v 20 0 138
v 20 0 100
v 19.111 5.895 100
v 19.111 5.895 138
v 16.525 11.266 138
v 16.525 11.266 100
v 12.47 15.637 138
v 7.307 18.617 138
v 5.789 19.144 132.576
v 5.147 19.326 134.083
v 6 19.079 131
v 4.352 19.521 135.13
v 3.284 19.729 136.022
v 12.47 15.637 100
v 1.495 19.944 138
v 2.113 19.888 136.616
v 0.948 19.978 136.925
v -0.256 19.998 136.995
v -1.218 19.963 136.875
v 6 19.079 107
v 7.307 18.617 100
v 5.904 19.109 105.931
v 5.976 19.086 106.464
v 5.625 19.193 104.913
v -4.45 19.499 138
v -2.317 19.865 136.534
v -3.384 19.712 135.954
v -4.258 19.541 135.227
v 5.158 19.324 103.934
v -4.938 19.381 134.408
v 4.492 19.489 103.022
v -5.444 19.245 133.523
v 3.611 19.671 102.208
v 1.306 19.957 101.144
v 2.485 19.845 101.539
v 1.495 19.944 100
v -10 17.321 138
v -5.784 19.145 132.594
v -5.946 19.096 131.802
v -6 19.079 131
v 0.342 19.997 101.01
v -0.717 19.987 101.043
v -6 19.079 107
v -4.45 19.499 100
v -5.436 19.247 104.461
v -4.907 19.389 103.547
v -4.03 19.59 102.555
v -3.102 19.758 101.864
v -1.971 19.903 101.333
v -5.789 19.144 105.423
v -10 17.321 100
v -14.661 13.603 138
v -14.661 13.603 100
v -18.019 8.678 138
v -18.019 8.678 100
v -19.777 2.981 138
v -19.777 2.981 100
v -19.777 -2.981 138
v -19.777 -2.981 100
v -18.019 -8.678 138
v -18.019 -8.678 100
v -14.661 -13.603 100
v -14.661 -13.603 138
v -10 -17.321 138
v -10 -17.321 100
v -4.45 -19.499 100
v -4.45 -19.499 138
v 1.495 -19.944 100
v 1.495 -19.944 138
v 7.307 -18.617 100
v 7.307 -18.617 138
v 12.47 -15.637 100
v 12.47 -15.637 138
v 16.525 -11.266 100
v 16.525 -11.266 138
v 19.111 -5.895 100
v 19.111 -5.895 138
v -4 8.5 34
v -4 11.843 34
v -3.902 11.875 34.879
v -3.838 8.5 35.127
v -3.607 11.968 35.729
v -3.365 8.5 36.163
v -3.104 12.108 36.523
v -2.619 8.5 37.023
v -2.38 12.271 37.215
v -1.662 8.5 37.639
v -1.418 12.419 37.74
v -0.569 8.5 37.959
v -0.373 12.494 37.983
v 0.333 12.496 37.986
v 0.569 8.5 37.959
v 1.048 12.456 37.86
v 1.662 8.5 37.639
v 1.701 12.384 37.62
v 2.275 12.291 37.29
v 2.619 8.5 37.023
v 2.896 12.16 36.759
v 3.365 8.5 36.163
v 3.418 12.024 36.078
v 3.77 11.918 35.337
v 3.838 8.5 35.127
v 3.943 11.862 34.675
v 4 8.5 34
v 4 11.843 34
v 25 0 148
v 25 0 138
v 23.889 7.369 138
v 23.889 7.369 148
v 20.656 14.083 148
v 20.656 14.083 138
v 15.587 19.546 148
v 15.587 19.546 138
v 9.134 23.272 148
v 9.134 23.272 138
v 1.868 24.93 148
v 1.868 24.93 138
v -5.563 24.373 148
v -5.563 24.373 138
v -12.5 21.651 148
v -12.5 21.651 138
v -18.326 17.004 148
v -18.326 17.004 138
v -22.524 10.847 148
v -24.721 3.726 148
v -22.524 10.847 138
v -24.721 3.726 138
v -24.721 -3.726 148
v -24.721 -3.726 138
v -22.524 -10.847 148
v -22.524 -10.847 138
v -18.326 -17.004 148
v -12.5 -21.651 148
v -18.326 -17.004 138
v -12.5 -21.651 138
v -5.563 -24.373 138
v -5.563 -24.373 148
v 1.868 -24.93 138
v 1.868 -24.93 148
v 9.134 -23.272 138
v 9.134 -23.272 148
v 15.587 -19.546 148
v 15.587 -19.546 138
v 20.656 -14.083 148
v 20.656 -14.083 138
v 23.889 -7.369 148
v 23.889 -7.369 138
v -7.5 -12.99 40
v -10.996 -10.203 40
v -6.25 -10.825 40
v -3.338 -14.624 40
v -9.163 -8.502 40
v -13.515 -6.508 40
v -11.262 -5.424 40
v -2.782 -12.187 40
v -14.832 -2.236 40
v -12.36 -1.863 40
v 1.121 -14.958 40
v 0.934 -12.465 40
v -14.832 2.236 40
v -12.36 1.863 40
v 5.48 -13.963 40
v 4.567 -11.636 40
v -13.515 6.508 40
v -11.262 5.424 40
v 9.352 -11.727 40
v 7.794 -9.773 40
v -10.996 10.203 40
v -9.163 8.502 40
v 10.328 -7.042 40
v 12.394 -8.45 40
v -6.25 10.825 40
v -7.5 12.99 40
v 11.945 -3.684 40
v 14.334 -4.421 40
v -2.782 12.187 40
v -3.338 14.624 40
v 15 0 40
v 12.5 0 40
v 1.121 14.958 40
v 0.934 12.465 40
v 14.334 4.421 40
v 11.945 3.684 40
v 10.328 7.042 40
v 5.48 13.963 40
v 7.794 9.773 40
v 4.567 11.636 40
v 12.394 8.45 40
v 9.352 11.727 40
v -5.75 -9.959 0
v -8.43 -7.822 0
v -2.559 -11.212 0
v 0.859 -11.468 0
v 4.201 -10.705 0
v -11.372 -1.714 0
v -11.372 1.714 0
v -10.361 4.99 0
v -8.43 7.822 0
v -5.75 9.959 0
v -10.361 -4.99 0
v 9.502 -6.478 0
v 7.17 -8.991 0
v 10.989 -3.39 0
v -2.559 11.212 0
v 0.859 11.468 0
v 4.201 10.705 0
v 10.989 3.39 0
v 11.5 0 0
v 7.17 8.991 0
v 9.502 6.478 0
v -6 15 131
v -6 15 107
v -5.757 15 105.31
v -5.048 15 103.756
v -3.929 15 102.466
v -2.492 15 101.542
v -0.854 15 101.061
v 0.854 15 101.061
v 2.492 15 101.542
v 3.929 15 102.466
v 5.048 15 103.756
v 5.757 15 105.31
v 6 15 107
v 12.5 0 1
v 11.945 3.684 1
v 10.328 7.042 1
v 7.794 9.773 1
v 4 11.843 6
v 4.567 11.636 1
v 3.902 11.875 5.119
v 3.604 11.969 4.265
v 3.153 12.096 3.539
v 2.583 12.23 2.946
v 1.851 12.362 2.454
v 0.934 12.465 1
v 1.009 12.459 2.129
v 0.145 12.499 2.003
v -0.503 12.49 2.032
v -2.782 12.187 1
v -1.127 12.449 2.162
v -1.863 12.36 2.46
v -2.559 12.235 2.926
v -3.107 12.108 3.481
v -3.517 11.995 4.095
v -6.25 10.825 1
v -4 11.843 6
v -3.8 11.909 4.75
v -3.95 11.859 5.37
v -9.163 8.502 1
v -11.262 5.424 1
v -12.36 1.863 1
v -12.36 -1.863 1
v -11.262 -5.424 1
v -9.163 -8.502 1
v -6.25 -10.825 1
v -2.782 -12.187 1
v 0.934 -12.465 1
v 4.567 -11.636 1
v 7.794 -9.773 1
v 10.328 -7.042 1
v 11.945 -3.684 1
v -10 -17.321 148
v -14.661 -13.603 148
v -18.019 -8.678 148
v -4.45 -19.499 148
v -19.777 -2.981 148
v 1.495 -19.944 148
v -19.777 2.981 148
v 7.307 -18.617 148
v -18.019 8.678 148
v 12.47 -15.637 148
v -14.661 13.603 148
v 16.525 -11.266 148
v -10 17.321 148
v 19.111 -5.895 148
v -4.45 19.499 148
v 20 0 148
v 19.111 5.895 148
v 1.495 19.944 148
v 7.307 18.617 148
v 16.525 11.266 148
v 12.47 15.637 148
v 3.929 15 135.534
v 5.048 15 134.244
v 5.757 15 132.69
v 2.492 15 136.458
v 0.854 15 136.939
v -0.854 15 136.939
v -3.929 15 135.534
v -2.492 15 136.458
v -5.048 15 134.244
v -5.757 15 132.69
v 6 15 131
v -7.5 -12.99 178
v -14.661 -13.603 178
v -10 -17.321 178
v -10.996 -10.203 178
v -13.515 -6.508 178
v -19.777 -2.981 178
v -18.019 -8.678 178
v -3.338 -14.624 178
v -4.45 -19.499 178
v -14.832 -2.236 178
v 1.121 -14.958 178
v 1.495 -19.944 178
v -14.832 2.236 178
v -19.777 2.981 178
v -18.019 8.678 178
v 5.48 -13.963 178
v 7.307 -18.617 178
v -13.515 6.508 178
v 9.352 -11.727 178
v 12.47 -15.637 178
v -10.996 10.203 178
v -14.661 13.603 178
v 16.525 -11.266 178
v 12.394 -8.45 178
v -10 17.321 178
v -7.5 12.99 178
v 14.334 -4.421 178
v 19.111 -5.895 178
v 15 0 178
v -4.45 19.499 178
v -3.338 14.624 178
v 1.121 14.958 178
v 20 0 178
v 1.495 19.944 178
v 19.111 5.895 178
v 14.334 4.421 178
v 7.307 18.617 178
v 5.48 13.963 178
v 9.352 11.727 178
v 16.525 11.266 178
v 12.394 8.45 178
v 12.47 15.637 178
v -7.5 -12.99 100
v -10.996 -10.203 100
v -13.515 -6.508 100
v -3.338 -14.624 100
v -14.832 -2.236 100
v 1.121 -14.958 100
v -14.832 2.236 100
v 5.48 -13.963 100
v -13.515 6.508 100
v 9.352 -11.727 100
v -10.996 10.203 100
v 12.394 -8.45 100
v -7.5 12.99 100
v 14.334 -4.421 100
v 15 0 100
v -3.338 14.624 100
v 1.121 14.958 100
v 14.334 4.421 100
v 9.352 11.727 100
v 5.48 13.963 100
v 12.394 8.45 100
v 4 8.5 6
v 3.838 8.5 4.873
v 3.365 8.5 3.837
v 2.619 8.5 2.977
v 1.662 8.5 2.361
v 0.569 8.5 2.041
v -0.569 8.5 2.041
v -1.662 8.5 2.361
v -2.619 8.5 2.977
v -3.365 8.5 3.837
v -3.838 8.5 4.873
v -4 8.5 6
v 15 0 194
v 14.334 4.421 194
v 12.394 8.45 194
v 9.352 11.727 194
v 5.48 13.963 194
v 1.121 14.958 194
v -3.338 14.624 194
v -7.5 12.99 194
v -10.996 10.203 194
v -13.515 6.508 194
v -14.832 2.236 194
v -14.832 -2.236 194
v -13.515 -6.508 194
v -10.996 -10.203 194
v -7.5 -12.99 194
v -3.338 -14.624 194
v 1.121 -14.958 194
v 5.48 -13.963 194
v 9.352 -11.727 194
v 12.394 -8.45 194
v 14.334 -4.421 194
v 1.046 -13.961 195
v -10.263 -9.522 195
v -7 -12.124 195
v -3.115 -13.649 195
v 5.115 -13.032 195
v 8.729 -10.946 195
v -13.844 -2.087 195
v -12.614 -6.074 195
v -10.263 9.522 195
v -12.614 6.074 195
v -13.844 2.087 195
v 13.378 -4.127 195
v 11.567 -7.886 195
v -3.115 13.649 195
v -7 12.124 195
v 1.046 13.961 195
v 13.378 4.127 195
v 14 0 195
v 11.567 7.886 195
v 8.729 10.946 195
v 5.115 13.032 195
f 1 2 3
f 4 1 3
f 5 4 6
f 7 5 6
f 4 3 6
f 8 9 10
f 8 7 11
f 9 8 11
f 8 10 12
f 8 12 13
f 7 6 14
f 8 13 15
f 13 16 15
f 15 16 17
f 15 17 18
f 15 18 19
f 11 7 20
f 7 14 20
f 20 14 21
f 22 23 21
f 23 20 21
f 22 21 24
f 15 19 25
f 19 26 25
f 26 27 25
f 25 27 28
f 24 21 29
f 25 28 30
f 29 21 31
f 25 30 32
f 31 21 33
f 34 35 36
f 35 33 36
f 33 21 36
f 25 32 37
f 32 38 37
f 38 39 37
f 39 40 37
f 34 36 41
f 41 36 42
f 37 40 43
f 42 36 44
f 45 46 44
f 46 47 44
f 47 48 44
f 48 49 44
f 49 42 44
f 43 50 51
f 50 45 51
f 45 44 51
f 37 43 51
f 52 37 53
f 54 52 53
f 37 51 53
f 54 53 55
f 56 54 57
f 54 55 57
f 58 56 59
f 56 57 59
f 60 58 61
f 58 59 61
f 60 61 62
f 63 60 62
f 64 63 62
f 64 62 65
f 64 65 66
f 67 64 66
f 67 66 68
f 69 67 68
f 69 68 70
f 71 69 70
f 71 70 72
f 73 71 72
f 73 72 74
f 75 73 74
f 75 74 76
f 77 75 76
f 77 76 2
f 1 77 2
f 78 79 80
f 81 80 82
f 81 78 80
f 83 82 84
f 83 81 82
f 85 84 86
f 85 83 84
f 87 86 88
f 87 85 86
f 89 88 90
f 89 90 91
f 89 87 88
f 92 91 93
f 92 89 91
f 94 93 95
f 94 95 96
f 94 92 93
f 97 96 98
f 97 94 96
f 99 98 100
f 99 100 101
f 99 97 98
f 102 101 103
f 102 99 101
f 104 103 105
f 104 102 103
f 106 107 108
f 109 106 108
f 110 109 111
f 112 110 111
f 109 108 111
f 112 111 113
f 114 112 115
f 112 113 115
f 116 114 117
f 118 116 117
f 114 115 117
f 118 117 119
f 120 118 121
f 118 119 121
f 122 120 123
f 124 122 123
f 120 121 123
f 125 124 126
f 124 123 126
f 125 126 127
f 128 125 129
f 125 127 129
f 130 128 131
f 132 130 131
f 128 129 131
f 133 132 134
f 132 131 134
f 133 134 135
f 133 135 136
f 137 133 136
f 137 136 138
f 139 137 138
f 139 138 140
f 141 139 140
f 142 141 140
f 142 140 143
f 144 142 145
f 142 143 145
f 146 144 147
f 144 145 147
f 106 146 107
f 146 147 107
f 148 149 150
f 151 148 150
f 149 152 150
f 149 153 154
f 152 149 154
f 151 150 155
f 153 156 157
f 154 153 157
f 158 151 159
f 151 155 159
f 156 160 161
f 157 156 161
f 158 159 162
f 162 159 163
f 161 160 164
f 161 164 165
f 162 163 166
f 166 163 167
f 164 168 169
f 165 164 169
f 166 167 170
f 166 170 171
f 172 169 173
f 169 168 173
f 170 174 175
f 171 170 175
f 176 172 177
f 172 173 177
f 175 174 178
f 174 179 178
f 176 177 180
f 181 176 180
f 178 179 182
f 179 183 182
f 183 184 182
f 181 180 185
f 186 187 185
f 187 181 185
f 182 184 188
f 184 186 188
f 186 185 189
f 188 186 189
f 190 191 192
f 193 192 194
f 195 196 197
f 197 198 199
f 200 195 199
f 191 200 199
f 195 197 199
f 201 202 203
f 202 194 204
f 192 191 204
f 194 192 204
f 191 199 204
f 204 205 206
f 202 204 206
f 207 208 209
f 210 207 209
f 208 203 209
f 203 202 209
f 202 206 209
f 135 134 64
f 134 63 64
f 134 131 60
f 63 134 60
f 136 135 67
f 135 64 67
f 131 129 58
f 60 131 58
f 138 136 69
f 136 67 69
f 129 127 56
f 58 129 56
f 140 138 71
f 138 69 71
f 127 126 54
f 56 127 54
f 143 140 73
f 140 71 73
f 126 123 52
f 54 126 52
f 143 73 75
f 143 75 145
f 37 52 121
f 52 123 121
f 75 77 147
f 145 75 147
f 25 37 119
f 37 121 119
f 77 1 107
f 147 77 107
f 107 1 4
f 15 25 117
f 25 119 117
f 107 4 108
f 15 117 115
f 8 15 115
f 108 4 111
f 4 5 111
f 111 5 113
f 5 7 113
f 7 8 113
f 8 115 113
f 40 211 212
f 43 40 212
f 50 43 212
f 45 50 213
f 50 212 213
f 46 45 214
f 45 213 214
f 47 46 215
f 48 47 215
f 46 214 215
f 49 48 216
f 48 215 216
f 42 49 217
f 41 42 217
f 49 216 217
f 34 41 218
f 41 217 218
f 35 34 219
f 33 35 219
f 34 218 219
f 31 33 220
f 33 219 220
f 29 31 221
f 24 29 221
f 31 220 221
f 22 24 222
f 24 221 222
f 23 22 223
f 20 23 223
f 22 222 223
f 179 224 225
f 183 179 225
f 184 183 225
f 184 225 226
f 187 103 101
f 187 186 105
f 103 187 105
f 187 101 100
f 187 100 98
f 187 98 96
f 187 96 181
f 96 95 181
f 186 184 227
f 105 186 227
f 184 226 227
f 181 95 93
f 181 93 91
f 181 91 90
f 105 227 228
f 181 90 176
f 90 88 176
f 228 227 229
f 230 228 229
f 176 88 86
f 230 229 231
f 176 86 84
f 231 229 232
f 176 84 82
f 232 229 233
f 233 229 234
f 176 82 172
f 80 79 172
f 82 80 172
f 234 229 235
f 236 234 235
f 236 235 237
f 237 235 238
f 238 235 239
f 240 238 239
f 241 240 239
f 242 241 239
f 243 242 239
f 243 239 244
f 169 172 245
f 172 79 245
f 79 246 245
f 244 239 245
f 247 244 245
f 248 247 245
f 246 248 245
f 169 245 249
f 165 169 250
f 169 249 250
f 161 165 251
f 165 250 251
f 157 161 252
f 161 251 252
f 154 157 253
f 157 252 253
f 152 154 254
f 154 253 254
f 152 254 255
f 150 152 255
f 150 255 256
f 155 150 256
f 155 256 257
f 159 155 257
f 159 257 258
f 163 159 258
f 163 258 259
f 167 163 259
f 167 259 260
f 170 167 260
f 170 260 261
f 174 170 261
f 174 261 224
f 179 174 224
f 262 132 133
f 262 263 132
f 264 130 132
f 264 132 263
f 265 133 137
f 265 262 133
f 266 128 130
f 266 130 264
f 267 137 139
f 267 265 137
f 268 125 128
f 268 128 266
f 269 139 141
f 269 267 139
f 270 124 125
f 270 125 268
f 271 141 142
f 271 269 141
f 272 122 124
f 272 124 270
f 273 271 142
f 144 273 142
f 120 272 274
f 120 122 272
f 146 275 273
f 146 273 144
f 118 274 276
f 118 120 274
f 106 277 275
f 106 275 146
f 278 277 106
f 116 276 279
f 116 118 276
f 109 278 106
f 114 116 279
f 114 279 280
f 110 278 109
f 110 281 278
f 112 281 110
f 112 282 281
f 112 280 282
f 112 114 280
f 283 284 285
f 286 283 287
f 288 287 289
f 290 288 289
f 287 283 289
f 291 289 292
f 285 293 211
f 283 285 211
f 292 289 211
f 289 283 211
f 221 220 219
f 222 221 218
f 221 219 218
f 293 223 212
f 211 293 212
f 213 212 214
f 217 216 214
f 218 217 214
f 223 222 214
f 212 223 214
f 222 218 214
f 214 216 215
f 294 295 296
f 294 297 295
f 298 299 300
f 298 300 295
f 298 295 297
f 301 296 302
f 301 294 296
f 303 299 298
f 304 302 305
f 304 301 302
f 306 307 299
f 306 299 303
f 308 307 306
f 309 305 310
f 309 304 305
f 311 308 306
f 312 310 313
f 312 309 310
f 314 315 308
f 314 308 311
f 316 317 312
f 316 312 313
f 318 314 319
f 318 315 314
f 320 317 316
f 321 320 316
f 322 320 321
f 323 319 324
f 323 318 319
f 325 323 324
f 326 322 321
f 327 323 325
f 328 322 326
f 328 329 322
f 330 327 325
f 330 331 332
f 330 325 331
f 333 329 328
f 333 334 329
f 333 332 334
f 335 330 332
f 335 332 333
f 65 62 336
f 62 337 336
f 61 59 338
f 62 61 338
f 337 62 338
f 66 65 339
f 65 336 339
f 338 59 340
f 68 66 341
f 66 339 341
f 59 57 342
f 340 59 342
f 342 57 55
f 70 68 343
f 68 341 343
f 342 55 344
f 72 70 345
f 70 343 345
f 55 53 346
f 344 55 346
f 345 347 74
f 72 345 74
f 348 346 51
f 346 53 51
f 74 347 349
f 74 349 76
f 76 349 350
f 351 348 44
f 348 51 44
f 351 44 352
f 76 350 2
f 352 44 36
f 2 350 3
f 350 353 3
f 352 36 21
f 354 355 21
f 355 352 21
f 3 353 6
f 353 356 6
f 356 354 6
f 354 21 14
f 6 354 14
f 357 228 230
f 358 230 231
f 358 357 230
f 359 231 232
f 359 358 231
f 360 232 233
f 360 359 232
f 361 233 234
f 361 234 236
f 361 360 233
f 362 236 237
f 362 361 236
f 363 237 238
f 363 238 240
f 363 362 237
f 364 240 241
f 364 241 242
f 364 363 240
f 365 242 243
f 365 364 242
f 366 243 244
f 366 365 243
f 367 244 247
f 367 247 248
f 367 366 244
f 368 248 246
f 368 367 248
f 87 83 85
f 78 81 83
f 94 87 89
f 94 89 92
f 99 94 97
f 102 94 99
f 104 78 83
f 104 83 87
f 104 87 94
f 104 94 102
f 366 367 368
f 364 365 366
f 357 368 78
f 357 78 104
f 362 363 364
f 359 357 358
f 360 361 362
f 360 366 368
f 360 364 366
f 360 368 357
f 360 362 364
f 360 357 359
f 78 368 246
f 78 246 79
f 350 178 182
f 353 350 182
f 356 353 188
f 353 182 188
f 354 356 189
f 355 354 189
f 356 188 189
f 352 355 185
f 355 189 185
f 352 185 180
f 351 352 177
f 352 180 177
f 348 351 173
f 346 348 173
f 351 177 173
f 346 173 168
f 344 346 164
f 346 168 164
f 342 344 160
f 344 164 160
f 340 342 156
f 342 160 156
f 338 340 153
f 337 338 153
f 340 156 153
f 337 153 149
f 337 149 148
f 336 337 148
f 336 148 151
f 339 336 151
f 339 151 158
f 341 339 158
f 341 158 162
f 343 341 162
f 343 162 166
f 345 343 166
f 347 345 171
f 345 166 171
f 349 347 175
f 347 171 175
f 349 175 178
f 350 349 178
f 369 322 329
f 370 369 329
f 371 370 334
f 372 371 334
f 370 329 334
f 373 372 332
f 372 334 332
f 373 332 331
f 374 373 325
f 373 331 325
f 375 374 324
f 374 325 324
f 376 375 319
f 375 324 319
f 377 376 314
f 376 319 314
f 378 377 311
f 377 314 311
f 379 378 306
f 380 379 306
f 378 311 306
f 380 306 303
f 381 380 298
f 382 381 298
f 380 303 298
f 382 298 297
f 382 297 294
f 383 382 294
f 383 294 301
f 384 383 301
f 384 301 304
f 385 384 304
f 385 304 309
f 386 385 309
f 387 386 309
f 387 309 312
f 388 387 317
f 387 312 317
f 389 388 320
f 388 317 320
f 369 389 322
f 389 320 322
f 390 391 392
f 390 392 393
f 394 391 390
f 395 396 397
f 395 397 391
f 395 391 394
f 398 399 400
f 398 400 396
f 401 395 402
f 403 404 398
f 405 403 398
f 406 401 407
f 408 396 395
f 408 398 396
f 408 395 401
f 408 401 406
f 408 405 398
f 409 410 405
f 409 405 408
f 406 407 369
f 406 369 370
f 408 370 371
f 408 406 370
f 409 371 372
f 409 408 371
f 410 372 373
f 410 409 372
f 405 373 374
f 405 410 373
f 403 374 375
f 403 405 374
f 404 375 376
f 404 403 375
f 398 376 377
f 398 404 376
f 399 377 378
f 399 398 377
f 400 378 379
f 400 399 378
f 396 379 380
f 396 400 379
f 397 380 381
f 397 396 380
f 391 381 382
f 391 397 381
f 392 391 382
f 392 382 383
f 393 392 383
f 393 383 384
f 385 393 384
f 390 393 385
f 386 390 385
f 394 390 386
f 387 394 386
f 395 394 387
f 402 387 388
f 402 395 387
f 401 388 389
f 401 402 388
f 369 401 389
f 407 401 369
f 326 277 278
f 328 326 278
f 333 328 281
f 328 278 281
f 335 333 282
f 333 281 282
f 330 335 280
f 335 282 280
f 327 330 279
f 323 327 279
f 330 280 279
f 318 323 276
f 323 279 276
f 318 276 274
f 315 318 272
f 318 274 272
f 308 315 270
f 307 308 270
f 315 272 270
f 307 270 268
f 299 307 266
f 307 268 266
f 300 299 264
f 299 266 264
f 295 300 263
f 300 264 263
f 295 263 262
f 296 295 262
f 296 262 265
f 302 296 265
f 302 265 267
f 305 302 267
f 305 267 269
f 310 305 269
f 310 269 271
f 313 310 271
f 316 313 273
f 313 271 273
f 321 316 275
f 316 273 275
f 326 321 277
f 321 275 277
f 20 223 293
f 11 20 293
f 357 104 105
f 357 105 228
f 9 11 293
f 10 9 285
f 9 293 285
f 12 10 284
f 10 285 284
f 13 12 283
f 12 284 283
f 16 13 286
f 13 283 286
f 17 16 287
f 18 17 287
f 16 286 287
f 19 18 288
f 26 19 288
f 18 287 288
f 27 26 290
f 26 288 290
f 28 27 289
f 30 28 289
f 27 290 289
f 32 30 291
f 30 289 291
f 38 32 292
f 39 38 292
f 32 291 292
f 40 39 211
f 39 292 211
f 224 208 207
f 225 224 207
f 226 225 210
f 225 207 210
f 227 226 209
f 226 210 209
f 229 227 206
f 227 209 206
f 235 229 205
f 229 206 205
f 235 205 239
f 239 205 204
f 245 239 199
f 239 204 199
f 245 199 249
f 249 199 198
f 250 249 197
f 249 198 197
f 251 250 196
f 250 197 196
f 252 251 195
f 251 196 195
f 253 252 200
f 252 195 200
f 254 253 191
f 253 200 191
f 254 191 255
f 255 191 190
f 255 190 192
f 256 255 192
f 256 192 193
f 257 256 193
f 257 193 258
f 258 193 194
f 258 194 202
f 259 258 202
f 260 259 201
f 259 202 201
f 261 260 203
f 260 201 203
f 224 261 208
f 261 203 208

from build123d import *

# Parameters (mm, degrees)
SKETCH_1_R          = 12.5
EXTRUDE_1_DEPTH     = 40
SKETCH_2_R          = 15
EXTRUDE_2_DEPTH     = 60
SKETCH_3_R          = 20
EXTRUDE_3_DEPTH     = 38
SKETCH_4_R          = 25
EXTRUDE_4_DEPTH     = 10
SKETCH_5_R          = 20
EXTRUDE_5_DEPTH     = 30
SKETCH_6_R          = 15
EXTRUDE_6_DEPTH     = 17
CHAMFER_1_SIZE      = 1
CHAMFER_2_SIZE      = 1
CUT_EXTRUDE_1_DEPTH = 24
CUT_EXTRUDE_2_DEPTH = 14


with BuildPart() as part:
    # 草图1 → 凸台-拉伸1 (new body)
    with BuildSketch(Plane.XY):
        Circle(SKETCH_1_R)
    extrude(amount=EXTRUDE_1_DEPTH)

    # 草图2 → 凸台-拉伸2 (add)
    with BuildSketch(Plane.XY.offset(40)):
        Circle(SKETCH_2_R)
    extrude(amount=EXTRUDE_2_DEPTH)

    # 草图3 → 凸台-拉伸3 (add)
    with BuildSketch(Plane.XY.offset(100)):
        Circle(SKETCH_3_R)
    extrude(amount=EXTRUDE_3_DEPTH)

    # 草图4 → 凸台-拉伸4 (add)
    with BuildSketch(Plane.XY.offset(138)):
        Circle(SKETCH_4_R)
    extrude(amount=EXTRUDE_4_DEPTH)

    # 草图5 → 凸台-拉伸5 (add)
    with BuildSketch(Plane.XY.offset(148)):
        Circle(SKETCH_5_R)
    extrude(amount=EXTRUDE_5_DEPTH)

    # 草图6 → 凸台-拉伸6 (add)
    with BuildSketch(Plane.XY.offset(178)):
        Circle(SKETCH_6_R)
    extrude(amount=EXTRUDE_6_DEPTH)

    # 倒角1
    chamfer_1_edges = [part.edges().sort_by_distance(p)[0] for p in [
        (-15, 0, 195),
    ]]
    chamfer(chamfer_1_edges, length=CHAMFER_1_SIZE)

    # 倒角2
    chamfer_2_edges = [part.edges().sort_by_distance(p)[0] for p in [
        (-12.5, 0, 0),
    ]]
    chamfer(chamfer_2_edges, length=CHAMFER_2_SIZE)

    # 草图7 → 切除-拉伸1 (cut)
    with BuildSketch(Plane(origin=(0, 15, 0), x_dir=(1, 0, 0), z_dir=(0, 1, 0))):
        with BuildLine():
            Line((-6, -131), (-6, -107))
            ThreePointArc((-6, -107), (0, -101), (6, -107))
            Line((6, -107), (6, -131))
            ThreePointArc((6, -131), (0, -137), (-6, -131))
        make_face()
    extrude(amount=CUT_EXTRUDE_1_DEPTH, mode=Mode.SUBTRACT)

    # 草图8 → 切除-拉伸2 (cut)
    with BuildSketch(Plane(origin=(0, 8.5, 0), x_dir=(1, 0, 0), z_dir=(0, 1, 0))):
        with BuildLine():
            Line((-4, -6), (-4, -34))
            ThreePointArc((-4, -34), (0, -38), (4, -34))
            Line((4, -34), (4, -6))
            ThreePointArc((4, -6), (0, -2), (-4, -6))
        make_face()
    extrude(amount=CUT_EXTRUDE_2_DEPTH, mode=Mode.SUBTRACT)


solid = part.part
